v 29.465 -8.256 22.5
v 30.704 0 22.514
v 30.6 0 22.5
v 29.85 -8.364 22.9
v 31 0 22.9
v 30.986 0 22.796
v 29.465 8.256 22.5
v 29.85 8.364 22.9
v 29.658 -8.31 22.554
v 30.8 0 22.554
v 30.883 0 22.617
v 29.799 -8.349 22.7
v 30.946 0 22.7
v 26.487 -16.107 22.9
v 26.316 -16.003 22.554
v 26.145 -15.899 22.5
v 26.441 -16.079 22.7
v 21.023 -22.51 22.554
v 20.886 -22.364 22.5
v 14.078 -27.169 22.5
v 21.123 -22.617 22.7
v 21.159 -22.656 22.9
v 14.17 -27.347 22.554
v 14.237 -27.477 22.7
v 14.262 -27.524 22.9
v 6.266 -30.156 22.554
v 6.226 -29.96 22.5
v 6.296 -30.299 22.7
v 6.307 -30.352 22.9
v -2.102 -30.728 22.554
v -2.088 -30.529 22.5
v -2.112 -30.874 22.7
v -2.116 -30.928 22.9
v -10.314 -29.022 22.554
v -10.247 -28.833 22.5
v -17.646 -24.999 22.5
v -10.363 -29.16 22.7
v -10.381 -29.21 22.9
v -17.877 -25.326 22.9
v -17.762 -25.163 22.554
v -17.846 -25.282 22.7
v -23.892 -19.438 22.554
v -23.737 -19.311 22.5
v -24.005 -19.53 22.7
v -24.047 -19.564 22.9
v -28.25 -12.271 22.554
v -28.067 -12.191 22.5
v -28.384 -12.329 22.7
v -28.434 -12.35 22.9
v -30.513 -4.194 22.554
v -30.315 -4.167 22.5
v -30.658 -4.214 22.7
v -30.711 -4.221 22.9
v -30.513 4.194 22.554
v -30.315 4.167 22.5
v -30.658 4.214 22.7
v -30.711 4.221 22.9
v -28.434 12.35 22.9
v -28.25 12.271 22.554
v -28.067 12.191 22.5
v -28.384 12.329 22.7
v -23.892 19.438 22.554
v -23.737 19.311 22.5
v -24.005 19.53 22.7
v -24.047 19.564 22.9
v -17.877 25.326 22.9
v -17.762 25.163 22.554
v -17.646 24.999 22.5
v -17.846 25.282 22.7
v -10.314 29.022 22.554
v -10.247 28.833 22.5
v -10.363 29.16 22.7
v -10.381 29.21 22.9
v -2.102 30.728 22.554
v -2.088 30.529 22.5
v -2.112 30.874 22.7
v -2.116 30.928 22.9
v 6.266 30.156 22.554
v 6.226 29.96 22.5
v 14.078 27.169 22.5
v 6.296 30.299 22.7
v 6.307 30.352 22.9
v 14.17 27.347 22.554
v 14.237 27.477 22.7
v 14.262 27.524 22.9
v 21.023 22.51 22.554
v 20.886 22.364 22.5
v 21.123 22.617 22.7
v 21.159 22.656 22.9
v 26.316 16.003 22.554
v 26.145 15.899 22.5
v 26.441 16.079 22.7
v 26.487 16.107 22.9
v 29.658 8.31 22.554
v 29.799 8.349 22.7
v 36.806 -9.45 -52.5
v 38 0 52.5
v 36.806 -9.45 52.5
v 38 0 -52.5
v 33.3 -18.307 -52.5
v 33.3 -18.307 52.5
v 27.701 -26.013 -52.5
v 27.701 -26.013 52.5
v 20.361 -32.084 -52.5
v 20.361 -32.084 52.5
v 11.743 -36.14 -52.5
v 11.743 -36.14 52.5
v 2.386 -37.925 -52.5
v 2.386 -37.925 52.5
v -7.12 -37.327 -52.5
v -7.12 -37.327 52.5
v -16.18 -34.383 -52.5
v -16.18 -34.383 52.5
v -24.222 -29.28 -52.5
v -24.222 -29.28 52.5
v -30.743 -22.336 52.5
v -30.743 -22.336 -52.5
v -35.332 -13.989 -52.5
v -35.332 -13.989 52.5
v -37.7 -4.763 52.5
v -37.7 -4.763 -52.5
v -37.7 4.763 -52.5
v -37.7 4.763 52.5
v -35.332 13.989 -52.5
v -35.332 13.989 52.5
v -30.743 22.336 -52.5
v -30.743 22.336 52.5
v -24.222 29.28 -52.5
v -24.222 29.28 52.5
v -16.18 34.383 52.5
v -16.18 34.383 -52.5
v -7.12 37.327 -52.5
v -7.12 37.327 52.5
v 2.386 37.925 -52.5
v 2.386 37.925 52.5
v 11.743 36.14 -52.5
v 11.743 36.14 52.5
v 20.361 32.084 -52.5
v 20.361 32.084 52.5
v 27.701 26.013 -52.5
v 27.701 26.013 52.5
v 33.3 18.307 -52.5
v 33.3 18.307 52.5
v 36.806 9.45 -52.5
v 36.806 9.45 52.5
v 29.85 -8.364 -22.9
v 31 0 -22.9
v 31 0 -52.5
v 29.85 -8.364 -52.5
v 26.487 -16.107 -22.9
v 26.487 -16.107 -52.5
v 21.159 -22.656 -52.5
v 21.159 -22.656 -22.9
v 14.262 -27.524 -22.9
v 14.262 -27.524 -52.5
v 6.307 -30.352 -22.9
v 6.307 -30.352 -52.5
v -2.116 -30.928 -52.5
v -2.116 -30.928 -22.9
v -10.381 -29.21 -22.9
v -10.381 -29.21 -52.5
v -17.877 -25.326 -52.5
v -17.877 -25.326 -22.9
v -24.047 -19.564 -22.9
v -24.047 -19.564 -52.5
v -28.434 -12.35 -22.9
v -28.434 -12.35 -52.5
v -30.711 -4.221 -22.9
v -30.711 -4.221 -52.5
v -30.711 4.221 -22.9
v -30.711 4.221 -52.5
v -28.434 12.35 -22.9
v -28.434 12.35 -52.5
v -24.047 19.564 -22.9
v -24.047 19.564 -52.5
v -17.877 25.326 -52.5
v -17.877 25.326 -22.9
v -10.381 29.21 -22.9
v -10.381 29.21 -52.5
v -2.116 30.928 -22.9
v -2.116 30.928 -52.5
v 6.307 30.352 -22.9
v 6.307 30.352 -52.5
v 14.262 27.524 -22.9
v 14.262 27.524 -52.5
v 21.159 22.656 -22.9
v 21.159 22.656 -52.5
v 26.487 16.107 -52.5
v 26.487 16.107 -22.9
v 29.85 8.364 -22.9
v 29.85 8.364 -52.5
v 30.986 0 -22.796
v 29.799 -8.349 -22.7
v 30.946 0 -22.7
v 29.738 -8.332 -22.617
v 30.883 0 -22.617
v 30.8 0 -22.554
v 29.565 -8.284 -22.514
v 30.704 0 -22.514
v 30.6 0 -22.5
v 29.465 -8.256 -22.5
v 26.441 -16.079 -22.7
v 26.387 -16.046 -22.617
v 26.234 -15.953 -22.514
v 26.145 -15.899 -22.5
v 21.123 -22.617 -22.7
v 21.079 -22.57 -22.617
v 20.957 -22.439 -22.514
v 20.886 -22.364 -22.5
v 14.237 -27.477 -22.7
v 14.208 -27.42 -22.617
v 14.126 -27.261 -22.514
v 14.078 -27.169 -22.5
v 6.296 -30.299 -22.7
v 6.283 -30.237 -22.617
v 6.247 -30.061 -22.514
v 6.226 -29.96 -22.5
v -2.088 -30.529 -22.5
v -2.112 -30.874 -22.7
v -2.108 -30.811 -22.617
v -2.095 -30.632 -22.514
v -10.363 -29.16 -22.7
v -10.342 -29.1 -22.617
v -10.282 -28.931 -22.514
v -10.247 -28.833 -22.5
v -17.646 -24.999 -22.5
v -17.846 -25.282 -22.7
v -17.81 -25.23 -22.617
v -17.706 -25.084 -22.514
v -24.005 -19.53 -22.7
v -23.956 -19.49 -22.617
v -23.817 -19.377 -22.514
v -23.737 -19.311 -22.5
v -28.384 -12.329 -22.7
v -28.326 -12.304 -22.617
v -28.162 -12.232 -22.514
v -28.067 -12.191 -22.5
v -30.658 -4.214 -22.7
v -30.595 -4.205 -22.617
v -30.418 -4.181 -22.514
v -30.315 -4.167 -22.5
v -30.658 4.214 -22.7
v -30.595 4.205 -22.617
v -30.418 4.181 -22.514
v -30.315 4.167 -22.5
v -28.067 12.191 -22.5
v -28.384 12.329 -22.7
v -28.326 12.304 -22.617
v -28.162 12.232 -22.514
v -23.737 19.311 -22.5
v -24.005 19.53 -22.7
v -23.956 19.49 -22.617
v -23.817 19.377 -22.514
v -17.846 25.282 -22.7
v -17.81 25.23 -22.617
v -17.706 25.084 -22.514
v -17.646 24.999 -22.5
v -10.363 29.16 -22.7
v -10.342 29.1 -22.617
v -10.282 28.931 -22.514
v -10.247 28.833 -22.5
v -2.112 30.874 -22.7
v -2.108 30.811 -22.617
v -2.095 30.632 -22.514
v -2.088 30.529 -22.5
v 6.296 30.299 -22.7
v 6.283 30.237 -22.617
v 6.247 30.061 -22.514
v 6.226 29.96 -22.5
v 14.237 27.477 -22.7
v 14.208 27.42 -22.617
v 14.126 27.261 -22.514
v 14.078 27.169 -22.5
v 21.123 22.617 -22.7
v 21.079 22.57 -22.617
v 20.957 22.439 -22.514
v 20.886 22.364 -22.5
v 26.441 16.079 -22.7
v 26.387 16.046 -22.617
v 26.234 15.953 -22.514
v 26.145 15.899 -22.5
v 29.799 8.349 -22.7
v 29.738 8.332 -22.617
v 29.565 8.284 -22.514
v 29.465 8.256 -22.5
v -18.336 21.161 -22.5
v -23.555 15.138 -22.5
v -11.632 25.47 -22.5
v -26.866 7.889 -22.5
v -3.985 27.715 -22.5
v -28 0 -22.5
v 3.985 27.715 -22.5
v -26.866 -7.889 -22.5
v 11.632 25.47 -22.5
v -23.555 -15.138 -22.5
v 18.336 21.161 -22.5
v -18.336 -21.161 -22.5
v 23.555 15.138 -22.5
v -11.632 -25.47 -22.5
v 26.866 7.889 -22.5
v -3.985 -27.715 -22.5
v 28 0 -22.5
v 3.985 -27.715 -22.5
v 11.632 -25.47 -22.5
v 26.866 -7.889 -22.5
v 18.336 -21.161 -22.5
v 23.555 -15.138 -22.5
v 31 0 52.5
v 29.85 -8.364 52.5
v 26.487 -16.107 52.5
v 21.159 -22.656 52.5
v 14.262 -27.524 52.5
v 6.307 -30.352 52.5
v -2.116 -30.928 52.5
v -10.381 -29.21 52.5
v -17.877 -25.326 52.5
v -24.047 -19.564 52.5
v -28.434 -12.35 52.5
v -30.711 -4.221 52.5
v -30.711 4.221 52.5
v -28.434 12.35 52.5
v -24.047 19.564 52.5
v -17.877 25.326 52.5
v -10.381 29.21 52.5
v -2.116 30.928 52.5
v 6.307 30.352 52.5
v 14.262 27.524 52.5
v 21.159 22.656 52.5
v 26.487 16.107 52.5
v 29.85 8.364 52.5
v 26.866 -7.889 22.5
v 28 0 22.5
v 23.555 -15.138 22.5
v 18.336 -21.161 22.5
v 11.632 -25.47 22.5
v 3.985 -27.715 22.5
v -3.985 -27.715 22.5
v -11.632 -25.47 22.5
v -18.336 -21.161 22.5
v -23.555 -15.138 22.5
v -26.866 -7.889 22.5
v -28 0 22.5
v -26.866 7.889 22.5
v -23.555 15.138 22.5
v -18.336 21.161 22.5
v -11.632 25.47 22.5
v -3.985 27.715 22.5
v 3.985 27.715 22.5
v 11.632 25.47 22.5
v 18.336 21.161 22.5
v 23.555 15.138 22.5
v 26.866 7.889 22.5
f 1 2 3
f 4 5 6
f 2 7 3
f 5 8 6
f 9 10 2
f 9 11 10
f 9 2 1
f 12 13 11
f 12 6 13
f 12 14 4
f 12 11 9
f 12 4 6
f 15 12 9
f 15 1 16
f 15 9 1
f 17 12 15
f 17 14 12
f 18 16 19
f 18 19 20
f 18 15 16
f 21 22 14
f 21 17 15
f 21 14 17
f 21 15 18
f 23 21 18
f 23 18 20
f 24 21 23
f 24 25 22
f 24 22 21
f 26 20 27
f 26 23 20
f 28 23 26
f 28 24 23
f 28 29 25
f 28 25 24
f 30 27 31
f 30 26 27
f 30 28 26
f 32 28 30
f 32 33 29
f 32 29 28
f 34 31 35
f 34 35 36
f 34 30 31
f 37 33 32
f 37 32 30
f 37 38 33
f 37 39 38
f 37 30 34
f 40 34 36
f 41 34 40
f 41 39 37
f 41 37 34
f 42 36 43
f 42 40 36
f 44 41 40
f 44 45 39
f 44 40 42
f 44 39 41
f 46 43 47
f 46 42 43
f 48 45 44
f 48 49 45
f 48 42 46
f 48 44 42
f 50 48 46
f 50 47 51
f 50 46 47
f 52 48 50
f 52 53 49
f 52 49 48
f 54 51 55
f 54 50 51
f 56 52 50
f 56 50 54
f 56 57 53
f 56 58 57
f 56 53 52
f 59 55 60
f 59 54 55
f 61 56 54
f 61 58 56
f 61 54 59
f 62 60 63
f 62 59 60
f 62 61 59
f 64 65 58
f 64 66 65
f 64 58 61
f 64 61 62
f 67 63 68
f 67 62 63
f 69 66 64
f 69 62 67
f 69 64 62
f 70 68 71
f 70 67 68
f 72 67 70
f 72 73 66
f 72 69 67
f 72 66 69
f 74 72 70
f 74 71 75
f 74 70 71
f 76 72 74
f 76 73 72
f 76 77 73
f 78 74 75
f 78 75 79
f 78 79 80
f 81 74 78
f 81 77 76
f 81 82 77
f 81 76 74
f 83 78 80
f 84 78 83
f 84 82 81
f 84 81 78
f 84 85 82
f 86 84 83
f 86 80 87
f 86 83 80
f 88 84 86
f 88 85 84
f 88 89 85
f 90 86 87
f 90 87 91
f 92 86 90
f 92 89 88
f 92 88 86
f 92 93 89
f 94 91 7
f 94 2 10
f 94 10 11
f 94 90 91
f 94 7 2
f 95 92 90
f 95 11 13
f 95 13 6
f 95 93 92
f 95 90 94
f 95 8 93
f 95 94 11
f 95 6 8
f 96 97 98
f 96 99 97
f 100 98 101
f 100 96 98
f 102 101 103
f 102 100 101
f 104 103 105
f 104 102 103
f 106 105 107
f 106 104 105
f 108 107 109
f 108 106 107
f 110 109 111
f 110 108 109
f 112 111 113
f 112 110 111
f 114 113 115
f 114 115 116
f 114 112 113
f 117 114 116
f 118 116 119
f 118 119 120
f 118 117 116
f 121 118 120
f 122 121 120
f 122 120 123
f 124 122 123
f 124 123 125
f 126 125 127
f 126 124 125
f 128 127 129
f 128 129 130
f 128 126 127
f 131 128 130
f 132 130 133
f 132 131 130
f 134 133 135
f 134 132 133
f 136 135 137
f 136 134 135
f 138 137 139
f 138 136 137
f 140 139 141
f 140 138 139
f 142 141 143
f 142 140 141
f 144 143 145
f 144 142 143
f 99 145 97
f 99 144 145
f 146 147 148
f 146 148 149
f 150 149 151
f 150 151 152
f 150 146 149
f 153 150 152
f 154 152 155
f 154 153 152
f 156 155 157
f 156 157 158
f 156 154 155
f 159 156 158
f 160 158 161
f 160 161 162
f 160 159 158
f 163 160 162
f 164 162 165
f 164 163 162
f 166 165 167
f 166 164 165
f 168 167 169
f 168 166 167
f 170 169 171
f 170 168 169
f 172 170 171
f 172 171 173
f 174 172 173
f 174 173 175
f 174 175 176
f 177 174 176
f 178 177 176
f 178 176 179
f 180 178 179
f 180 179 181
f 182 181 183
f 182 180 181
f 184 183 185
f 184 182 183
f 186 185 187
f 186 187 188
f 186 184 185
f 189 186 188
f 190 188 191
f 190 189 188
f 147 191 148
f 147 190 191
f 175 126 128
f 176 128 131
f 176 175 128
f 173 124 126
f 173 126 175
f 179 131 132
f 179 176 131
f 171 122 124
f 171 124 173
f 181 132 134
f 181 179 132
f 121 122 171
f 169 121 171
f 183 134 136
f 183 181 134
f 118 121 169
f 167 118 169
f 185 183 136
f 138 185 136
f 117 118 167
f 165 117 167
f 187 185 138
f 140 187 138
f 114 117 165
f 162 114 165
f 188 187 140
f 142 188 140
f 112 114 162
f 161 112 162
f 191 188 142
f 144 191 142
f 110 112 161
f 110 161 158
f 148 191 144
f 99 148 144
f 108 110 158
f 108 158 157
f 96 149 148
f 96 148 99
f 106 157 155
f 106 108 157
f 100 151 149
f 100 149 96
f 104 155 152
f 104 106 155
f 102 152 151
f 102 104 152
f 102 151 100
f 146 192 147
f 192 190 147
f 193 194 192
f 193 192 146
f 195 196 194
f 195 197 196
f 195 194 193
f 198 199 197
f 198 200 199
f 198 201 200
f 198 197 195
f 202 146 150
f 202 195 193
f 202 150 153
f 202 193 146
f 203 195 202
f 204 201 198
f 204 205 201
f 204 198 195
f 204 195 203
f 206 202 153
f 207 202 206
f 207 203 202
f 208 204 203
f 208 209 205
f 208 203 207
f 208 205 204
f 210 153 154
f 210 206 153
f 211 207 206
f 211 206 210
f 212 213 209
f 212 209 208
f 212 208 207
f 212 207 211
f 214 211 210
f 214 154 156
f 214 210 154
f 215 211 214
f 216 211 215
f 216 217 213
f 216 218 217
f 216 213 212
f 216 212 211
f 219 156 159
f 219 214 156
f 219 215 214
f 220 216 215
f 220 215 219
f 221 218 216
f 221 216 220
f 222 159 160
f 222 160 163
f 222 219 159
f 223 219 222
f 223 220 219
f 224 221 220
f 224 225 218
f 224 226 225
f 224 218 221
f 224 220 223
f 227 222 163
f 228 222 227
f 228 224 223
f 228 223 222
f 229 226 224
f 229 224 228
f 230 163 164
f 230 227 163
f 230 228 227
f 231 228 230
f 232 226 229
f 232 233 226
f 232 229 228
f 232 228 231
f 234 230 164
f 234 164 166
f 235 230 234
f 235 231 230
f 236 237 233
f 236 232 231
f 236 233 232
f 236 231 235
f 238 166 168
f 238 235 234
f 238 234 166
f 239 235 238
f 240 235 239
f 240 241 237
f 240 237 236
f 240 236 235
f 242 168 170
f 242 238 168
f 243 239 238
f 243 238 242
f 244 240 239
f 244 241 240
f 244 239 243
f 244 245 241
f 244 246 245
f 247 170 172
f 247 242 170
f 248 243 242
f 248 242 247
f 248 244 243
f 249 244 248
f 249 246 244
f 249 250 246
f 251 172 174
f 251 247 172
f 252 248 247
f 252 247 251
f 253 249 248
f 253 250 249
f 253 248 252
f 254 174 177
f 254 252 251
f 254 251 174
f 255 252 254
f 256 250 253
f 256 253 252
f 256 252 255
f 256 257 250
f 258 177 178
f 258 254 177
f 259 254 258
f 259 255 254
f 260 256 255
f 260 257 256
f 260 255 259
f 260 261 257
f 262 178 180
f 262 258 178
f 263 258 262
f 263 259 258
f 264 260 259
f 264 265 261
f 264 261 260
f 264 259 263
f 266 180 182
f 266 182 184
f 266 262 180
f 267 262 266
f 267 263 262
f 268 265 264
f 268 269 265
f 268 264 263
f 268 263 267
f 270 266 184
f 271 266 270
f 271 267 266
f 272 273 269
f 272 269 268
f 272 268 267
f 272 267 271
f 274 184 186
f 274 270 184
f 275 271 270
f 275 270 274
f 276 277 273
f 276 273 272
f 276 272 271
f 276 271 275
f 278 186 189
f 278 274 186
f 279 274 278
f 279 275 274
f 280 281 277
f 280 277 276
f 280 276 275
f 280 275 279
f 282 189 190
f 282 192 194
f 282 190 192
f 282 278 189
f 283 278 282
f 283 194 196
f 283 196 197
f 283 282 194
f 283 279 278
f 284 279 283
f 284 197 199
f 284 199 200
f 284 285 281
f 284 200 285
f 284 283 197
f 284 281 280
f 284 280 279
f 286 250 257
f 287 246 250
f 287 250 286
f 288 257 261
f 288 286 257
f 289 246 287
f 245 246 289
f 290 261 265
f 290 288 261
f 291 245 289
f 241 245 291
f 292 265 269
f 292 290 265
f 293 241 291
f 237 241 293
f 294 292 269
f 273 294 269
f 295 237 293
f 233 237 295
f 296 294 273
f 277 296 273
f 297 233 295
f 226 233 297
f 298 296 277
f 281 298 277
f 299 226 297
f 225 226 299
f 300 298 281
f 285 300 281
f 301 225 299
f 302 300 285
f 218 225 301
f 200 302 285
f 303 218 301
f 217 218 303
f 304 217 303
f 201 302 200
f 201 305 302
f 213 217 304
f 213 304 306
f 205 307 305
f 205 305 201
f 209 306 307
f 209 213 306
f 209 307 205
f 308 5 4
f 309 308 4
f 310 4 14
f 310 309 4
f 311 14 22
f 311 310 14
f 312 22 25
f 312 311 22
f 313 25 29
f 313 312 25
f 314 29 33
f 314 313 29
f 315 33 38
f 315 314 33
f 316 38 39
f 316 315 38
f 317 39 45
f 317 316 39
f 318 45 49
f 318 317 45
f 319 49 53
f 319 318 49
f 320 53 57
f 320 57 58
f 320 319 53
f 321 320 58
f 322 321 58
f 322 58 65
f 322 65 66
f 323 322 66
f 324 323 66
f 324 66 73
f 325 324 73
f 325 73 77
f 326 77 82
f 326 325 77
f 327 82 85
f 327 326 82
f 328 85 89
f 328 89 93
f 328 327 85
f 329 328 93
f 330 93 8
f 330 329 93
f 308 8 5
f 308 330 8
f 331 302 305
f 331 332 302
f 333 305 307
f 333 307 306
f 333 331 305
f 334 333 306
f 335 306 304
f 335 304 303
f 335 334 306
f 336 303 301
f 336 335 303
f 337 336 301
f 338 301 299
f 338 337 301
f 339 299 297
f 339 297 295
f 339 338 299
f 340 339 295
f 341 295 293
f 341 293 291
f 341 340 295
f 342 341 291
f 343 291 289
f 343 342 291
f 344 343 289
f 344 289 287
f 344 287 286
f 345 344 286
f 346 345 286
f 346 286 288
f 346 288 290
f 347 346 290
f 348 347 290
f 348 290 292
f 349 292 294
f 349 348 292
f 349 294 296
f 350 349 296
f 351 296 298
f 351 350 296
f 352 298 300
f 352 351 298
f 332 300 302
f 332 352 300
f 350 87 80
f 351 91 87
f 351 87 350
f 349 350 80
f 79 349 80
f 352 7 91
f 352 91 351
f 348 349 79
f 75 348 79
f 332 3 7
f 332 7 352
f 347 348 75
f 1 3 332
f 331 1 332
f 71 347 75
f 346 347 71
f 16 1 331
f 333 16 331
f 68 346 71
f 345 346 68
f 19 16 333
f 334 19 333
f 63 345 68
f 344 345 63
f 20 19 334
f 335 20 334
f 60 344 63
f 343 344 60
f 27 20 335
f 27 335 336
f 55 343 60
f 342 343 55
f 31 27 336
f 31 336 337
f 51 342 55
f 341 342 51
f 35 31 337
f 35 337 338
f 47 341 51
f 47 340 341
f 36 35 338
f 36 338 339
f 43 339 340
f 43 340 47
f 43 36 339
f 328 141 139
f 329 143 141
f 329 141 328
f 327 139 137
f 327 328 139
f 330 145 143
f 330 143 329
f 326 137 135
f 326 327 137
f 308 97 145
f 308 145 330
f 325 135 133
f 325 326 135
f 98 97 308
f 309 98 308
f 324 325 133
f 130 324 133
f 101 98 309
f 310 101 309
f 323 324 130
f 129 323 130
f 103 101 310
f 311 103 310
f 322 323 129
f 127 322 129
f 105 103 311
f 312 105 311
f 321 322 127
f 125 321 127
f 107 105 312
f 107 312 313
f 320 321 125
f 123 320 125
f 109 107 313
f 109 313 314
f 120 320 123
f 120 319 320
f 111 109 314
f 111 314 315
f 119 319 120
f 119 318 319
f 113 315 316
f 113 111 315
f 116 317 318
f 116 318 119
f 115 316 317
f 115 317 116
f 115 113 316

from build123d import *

# Parameters (mm, degrees)
CONG_1_R = 0.4


with BuildPart() as part:
    # Esquisse1 → Révolution1 (revolve)
    with BuildSketch(Plane(origin=(0, 0, 0), x_dir=(0, 0, -1), z_dir=(1, 0, 0)), mode=Mode.PRIVATE) as r_volution1_sk:
        Polygon((-52.5, 38), (52.5, 38), (52.5, 31), (22.5, 31), (22.5, 28), (-22.5, 28), (-22.5, 31), (-52.5, 31), align=None)
    revolve(r_volution1_sk.sketch.rotate(Axis((0, 0, 52.5), (0, 0, -1)), 90), axis=Axis((0, 0, 52.5), (0, 0, -1)))  # turned: the seam where the file's is

    # Congé1
    cong_1_edges = [part.edges().sort_by_distance(p)[0] for p in [
        (-31, 0, 22.5),
        (-31, 0, -22.5),
    ]]
    fillet(cong_1_edges, radius=CONG_1_R)


solid = part.part
